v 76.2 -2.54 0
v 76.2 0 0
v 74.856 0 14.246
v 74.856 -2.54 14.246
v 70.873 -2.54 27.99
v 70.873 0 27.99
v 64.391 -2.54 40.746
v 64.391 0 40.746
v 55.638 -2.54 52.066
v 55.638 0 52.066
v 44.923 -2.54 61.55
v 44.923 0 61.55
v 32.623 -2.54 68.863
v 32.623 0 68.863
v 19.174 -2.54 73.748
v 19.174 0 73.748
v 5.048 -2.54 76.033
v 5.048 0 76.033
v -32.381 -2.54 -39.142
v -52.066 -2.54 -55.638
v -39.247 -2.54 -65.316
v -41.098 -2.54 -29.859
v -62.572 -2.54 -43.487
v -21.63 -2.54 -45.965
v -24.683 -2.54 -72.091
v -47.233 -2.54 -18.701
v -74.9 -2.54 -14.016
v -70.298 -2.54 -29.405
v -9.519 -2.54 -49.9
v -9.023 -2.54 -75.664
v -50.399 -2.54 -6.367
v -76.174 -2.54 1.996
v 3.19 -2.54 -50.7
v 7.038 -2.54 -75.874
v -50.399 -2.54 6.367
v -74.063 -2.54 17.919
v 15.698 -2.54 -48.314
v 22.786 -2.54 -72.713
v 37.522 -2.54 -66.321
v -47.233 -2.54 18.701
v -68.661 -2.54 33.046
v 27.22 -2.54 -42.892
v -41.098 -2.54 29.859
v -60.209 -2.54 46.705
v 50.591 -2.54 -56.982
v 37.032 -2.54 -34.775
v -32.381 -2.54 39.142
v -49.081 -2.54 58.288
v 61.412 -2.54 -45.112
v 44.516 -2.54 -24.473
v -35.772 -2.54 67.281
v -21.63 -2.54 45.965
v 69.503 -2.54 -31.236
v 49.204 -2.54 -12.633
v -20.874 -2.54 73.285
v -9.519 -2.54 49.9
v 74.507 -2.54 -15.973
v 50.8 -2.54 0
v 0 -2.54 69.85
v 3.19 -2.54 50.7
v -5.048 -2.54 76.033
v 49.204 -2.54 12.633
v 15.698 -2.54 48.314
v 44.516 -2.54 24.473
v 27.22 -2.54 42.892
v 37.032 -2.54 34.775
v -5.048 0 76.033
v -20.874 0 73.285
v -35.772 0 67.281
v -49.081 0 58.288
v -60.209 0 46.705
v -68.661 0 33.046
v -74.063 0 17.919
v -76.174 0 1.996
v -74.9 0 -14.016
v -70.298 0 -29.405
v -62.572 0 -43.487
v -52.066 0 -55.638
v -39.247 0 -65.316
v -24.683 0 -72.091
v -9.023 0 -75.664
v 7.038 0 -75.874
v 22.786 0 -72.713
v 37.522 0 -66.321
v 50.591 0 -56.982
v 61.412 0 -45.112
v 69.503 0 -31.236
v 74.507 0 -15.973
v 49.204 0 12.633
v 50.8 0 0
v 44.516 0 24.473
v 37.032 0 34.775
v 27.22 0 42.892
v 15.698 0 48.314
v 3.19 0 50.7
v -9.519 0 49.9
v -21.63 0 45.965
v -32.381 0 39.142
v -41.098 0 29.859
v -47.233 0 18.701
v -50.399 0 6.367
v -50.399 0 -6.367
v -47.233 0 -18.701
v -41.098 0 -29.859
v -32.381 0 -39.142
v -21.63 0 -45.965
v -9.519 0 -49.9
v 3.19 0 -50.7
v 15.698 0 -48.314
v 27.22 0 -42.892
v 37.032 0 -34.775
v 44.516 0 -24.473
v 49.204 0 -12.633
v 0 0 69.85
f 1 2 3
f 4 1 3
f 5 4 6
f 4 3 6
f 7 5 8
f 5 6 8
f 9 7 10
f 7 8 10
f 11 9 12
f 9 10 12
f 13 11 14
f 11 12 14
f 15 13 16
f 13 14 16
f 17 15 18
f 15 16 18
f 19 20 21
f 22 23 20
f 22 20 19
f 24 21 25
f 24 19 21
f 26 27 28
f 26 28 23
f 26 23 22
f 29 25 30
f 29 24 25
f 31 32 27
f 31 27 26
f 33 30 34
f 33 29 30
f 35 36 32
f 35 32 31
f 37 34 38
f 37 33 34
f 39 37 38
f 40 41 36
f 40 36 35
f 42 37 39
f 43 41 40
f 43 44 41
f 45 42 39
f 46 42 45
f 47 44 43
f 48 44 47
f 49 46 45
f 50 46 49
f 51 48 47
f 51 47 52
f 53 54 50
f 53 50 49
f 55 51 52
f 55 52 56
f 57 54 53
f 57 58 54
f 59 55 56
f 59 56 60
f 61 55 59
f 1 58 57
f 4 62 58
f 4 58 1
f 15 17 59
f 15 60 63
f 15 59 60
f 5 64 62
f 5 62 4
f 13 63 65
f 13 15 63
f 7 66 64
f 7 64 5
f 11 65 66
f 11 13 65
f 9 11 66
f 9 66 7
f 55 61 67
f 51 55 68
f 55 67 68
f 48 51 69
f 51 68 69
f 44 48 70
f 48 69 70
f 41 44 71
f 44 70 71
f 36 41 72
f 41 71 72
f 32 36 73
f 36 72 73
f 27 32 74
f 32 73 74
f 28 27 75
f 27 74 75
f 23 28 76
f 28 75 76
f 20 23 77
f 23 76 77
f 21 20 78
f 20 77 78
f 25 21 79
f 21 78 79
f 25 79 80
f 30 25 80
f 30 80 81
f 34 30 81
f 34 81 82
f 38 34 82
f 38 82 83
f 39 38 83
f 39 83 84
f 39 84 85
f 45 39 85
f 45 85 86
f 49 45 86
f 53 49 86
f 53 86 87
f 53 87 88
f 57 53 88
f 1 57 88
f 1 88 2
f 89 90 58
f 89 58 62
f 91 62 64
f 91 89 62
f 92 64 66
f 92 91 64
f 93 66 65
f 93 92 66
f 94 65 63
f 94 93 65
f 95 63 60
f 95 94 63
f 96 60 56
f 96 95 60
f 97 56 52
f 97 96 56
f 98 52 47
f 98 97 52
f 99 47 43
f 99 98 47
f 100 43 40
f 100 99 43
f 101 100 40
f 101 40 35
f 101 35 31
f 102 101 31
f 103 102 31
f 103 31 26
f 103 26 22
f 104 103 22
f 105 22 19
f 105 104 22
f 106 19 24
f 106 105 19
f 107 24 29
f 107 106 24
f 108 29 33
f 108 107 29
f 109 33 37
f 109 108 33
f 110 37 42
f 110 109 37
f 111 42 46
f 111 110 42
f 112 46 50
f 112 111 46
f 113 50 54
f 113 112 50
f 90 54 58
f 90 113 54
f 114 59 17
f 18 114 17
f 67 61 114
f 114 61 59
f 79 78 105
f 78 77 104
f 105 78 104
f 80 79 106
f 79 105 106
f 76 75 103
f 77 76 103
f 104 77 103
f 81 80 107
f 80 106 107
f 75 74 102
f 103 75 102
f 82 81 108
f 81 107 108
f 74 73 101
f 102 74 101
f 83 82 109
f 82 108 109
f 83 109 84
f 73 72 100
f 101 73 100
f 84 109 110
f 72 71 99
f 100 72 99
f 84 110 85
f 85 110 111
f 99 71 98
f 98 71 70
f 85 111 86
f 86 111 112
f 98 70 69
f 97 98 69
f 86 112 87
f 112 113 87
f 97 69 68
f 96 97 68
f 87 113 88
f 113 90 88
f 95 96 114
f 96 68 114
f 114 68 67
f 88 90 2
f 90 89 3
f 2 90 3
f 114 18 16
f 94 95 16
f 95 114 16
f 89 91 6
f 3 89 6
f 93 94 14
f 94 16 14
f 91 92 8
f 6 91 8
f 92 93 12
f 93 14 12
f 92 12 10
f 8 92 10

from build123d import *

# Parameters (mm, degrees)
F0_R     = 76.2
F0_R_2   = 50.8
F1_DEPTH = 2.54
F3_DEPTH = 25.4


with BuildPart() as f1:
    # F0 (on Front) → F1 (new body)
    with BuildSketch(Plane.XZ):
        Circle(F0_R)
        Circle(F0_R_2, mode=Mode.SUBTRACT)
    extrude(amount=F1_DEPTH)

    # F2 (on face) → F3 (cut)
    with BuildSketch(Plane.XZ.offset(2.54)):
        Polygon((-6.221704, 77.47), (0, 69.85), (6.221704, 77.47), align=None)
    extrude(amount=-F3_DEPTH, mode=Mode.SUBTRACT)


solid = f1.part
